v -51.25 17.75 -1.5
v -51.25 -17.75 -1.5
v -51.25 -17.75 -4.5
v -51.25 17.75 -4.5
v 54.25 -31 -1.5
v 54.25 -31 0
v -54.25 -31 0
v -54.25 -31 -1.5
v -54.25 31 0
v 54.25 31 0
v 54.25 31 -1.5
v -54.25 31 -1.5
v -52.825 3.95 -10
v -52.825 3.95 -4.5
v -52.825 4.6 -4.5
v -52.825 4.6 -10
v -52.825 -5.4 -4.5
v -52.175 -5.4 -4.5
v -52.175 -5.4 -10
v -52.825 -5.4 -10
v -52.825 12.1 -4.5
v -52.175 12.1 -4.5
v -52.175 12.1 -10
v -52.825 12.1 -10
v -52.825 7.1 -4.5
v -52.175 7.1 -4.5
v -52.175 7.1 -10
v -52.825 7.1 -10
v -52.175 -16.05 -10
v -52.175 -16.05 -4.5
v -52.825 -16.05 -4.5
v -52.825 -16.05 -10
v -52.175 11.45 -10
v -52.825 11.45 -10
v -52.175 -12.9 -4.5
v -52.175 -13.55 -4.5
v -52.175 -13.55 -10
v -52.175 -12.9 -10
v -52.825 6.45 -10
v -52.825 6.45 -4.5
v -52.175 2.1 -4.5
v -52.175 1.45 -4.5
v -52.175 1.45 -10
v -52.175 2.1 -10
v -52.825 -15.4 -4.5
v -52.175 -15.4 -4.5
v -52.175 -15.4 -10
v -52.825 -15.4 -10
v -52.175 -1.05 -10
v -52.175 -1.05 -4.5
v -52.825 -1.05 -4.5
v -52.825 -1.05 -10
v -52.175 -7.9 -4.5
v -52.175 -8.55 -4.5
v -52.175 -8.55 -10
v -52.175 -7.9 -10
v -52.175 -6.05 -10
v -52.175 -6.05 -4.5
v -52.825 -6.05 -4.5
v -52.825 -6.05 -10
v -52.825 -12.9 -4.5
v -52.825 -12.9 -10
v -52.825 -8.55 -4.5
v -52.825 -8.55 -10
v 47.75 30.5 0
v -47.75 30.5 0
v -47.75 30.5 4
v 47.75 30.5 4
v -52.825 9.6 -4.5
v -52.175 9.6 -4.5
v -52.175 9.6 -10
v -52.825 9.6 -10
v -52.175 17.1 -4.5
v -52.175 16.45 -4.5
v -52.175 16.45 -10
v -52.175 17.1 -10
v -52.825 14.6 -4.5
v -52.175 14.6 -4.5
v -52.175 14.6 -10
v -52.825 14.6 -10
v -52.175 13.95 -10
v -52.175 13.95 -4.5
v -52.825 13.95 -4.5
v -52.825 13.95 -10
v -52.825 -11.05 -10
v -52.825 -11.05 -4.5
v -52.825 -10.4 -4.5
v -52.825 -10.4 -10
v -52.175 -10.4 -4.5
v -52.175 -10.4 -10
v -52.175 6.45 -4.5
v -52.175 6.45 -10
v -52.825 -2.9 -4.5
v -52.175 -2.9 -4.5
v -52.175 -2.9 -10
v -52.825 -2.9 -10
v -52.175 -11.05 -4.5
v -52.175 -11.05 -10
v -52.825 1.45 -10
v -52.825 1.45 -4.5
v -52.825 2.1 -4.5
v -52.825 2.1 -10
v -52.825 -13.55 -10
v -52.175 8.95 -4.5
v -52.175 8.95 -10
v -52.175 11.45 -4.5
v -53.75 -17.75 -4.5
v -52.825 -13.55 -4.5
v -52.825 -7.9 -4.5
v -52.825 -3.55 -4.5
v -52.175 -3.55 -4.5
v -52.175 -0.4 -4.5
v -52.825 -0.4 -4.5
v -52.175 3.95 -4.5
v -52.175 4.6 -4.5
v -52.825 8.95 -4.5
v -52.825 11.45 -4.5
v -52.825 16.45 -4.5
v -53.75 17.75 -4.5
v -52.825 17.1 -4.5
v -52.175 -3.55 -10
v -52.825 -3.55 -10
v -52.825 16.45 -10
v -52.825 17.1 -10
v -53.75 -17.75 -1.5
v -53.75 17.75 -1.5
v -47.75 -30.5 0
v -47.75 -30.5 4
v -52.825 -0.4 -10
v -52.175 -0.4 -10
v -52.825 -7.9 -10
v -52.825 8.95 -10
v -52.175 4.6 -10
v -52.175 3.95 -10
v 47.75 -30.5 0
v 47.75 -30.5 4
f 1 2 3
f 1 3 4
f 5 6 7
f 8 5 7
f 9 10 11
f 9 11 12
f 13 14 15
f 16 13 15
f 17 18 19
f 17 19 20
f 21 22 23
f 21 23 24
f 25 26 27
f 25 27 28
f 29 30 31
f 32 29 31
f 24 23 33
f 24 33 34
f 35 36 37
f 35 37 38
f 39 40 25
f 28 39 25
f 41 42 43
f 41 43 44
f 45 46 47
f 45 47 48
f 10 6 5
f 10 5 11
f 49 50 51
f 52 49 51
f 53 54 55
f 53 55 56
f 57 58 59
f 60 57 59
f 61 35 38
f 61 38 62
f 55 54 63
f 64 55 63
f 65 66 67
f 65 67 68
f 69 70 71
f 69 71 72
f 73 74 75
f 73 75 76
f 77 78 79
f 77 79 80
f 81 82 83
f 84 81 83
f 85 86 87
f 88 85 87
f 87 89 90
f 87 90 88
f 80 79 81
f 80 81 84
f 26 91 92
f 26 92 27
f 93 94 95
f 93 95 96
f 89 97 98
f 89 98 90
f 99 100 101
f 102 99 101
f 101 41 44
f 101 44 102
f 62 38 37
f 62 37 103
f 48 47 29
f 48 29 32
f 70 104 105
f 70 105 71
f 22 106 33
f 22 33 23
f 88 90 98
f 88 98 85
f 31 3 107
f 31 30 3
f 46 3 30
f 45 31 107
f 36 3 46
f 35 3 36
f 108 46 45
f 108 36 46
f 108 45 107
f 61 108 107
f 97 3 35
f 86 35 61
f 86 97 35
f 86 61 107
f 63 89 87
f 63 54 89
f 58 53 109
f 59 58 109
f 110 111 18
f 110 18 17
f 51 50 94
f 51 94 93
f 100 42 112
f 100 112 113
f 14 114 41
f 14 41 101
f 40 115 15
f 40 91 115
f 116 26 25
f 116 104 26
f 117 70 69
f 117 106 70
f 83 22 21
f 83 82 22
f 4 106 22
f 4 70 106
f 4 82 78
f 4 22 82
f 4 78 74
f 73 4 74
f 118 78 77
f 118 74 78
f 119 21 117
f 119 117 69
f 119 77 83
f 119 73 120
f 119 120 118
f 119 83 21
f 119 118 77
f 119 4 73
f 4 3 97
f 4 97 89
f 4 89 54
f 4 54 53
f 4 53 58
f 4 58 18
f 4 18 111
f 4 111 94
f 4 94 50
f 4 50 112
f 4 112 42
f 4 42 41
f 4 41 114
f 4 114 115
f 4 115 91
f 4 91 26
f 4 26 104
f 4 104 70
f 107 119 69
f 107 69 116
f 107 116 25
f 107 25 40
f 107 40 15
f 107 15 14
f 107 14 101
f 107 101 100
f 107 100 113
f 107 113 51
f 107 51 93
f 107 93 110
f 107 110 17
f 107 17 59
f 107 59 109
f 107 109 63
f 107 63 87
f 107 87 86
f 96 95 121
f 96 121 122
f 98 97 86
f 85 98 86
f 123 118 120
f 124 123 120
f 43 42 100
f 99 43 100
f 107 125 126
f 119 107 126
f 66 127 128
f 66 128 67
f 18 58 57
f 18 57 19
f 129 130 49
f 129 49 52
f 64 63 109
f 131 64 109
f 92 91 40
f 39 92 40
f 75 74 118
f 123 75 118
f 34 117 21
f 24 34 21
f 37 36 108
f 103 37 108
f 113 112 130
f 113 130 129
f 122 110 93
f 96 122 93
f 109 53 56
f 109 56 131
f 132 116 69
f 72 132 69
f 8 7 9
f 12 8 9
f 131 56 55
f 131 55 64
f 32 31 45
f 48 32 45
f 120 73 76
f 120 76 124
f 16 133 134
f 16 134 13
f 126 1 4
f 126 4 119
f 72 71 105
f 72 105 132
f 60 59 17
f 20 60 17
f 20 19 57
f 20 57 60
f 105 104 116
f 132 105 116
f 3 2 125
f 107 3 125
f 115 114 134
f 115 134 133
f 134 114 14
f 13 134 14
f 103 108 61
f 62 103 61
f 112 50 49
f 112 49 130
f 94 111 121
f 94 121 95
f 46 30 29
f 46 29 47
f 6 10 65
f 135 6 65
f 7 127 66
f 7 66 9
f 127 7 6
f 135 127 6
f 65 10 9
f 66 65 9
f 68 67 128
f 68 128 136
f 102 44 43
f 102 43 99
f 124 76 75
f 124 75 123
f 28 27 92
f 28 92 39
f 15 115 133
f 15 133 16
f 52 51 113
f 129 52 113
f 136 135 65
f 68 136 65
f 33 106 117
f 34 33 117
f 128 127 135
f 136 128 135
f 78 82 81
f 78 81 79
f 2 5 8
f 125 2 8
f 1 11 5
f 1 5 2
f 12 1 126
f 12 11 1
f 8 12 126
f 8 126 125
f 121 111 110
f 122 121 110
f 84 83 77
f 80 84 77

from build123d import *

# Parameters (mm, degrees)
ESQUISSE1_W        = 95.5
ESQUISSE1_H        = 61
BOSS_EXTRU_1_DEPTH = 4
ESQUISSE2_W        = 108.5
ESQUISSE2_H        = 62
BOSS_EXTRU_2_DEPTH = 1.5
ESQUISSE3_W        = 2.5
ESQUISSE3_H        = 35.5
BOSS_EXTRU_3_DEPTH = 3
ESQUISSE4_W        = 0.65
ESQUISSE4_H        = 0.65
BOSS_EXTRU_4_DEPTH = 5.5


with BuildPart() as part:
    # Esquisse1 → Boss.-Extru.1 (new body)
    with BuildSketch(Plane.XY):
        Rectangle(ESQUISSE1_W, ESQUISSE1_H)
    extrude(amount=BOSS_EXTRU_1_DEPTH)

    # Esquisse2 → Boss.-Extru.2 (add)
    with BuildSketch(Plane(origin=(0, 0, 0), x_dir=(-1, 0, 0), z_dir=(0, 0, -1))):
        Rectangle(ESQUISSE2_W, ESQUISSE2_H)
    extrude(amount=BOSS_EXTRU_2_DEPTH)

    # Esquisse3 → Boss.-Extru.3 (add)
    with BuildSketch(Plane(origin=(0, 0, -1.5), x_dir=(-1, 0, 0), z_dir=(0, 0, -1))):
        with Locations((52.5, 0)):
            Rectangle(ESQUISSE3_W, ESQUISSE3_H)
    extrude(amount=BOSS_EXTRU_3_DEPTH)

    # Esquisse4 → Boss.-Extru.4 (add)
    with BuildSketch(Plane(origin=(0, 0, -4.5), x_dir=(-1, 0, 0), z_dir=(0, 0, -1))):
        with Locations((52.5, 16.775)):
            Rectangle(ESQUISSE4_W, ESQUISSE4_H)
        with Locations((52.5, 14.275)):
            Rectangle(ESQUISSE4_W, ESQUISSE4_H)
        with Locations((52.5, 11.775)):
            Rectangle(ESQUISSE4_W, ESQUISSE4_H)
        with Locations((52.5, 9.275)):
            Rectangle(ESQUISSE4_W, ESQUISSE4_H)
        with Locations((52.5, 6.775)):
            Rectangle(ESQUISSE4_W, ESQUISSE4_H)
        with Locations((52.5, 4.275)):
            Rectangle(ESQUISSE4_W, ESQUISSE4_H)
        with Locations((52.5, 1.775)):
            Rectangle(ESQUISSE4_W, ESQUISSE4_H)
        with Locations((52.5, -0.725)):
            Rectangle(ESQUISSE4_W, ESQUISSE4_H)
        with Locations((52.5, -3.225)):
            Rectangle(ESQUISSE4_W, ESQUISSE4_H)
        with Locations((52.5, -5.725)):
            Rectangle(ESQUISSE4_W, ESQUISSE4_H)
        with Locations((52.5, -8.225)):
            Rectangle(ESQUISSE4_W, ESQUISSE4_H)
        with Locations((52.5, -10.725)):
            Rectangle(ESQUISSE4_W, ESQUISSE4_H)
        with Locations((52.5, -13.225)):
            Rectangle(ESQUISSE4_W, ESQUISSE4_H)
        with Locations((52.5, -15.725)):
            Rectangle(ESQUISSE4_W, ESQUISSE4_H)
    extrude(amount=BOSS_EXTRU_4_DEPTH)


solid = part.part
